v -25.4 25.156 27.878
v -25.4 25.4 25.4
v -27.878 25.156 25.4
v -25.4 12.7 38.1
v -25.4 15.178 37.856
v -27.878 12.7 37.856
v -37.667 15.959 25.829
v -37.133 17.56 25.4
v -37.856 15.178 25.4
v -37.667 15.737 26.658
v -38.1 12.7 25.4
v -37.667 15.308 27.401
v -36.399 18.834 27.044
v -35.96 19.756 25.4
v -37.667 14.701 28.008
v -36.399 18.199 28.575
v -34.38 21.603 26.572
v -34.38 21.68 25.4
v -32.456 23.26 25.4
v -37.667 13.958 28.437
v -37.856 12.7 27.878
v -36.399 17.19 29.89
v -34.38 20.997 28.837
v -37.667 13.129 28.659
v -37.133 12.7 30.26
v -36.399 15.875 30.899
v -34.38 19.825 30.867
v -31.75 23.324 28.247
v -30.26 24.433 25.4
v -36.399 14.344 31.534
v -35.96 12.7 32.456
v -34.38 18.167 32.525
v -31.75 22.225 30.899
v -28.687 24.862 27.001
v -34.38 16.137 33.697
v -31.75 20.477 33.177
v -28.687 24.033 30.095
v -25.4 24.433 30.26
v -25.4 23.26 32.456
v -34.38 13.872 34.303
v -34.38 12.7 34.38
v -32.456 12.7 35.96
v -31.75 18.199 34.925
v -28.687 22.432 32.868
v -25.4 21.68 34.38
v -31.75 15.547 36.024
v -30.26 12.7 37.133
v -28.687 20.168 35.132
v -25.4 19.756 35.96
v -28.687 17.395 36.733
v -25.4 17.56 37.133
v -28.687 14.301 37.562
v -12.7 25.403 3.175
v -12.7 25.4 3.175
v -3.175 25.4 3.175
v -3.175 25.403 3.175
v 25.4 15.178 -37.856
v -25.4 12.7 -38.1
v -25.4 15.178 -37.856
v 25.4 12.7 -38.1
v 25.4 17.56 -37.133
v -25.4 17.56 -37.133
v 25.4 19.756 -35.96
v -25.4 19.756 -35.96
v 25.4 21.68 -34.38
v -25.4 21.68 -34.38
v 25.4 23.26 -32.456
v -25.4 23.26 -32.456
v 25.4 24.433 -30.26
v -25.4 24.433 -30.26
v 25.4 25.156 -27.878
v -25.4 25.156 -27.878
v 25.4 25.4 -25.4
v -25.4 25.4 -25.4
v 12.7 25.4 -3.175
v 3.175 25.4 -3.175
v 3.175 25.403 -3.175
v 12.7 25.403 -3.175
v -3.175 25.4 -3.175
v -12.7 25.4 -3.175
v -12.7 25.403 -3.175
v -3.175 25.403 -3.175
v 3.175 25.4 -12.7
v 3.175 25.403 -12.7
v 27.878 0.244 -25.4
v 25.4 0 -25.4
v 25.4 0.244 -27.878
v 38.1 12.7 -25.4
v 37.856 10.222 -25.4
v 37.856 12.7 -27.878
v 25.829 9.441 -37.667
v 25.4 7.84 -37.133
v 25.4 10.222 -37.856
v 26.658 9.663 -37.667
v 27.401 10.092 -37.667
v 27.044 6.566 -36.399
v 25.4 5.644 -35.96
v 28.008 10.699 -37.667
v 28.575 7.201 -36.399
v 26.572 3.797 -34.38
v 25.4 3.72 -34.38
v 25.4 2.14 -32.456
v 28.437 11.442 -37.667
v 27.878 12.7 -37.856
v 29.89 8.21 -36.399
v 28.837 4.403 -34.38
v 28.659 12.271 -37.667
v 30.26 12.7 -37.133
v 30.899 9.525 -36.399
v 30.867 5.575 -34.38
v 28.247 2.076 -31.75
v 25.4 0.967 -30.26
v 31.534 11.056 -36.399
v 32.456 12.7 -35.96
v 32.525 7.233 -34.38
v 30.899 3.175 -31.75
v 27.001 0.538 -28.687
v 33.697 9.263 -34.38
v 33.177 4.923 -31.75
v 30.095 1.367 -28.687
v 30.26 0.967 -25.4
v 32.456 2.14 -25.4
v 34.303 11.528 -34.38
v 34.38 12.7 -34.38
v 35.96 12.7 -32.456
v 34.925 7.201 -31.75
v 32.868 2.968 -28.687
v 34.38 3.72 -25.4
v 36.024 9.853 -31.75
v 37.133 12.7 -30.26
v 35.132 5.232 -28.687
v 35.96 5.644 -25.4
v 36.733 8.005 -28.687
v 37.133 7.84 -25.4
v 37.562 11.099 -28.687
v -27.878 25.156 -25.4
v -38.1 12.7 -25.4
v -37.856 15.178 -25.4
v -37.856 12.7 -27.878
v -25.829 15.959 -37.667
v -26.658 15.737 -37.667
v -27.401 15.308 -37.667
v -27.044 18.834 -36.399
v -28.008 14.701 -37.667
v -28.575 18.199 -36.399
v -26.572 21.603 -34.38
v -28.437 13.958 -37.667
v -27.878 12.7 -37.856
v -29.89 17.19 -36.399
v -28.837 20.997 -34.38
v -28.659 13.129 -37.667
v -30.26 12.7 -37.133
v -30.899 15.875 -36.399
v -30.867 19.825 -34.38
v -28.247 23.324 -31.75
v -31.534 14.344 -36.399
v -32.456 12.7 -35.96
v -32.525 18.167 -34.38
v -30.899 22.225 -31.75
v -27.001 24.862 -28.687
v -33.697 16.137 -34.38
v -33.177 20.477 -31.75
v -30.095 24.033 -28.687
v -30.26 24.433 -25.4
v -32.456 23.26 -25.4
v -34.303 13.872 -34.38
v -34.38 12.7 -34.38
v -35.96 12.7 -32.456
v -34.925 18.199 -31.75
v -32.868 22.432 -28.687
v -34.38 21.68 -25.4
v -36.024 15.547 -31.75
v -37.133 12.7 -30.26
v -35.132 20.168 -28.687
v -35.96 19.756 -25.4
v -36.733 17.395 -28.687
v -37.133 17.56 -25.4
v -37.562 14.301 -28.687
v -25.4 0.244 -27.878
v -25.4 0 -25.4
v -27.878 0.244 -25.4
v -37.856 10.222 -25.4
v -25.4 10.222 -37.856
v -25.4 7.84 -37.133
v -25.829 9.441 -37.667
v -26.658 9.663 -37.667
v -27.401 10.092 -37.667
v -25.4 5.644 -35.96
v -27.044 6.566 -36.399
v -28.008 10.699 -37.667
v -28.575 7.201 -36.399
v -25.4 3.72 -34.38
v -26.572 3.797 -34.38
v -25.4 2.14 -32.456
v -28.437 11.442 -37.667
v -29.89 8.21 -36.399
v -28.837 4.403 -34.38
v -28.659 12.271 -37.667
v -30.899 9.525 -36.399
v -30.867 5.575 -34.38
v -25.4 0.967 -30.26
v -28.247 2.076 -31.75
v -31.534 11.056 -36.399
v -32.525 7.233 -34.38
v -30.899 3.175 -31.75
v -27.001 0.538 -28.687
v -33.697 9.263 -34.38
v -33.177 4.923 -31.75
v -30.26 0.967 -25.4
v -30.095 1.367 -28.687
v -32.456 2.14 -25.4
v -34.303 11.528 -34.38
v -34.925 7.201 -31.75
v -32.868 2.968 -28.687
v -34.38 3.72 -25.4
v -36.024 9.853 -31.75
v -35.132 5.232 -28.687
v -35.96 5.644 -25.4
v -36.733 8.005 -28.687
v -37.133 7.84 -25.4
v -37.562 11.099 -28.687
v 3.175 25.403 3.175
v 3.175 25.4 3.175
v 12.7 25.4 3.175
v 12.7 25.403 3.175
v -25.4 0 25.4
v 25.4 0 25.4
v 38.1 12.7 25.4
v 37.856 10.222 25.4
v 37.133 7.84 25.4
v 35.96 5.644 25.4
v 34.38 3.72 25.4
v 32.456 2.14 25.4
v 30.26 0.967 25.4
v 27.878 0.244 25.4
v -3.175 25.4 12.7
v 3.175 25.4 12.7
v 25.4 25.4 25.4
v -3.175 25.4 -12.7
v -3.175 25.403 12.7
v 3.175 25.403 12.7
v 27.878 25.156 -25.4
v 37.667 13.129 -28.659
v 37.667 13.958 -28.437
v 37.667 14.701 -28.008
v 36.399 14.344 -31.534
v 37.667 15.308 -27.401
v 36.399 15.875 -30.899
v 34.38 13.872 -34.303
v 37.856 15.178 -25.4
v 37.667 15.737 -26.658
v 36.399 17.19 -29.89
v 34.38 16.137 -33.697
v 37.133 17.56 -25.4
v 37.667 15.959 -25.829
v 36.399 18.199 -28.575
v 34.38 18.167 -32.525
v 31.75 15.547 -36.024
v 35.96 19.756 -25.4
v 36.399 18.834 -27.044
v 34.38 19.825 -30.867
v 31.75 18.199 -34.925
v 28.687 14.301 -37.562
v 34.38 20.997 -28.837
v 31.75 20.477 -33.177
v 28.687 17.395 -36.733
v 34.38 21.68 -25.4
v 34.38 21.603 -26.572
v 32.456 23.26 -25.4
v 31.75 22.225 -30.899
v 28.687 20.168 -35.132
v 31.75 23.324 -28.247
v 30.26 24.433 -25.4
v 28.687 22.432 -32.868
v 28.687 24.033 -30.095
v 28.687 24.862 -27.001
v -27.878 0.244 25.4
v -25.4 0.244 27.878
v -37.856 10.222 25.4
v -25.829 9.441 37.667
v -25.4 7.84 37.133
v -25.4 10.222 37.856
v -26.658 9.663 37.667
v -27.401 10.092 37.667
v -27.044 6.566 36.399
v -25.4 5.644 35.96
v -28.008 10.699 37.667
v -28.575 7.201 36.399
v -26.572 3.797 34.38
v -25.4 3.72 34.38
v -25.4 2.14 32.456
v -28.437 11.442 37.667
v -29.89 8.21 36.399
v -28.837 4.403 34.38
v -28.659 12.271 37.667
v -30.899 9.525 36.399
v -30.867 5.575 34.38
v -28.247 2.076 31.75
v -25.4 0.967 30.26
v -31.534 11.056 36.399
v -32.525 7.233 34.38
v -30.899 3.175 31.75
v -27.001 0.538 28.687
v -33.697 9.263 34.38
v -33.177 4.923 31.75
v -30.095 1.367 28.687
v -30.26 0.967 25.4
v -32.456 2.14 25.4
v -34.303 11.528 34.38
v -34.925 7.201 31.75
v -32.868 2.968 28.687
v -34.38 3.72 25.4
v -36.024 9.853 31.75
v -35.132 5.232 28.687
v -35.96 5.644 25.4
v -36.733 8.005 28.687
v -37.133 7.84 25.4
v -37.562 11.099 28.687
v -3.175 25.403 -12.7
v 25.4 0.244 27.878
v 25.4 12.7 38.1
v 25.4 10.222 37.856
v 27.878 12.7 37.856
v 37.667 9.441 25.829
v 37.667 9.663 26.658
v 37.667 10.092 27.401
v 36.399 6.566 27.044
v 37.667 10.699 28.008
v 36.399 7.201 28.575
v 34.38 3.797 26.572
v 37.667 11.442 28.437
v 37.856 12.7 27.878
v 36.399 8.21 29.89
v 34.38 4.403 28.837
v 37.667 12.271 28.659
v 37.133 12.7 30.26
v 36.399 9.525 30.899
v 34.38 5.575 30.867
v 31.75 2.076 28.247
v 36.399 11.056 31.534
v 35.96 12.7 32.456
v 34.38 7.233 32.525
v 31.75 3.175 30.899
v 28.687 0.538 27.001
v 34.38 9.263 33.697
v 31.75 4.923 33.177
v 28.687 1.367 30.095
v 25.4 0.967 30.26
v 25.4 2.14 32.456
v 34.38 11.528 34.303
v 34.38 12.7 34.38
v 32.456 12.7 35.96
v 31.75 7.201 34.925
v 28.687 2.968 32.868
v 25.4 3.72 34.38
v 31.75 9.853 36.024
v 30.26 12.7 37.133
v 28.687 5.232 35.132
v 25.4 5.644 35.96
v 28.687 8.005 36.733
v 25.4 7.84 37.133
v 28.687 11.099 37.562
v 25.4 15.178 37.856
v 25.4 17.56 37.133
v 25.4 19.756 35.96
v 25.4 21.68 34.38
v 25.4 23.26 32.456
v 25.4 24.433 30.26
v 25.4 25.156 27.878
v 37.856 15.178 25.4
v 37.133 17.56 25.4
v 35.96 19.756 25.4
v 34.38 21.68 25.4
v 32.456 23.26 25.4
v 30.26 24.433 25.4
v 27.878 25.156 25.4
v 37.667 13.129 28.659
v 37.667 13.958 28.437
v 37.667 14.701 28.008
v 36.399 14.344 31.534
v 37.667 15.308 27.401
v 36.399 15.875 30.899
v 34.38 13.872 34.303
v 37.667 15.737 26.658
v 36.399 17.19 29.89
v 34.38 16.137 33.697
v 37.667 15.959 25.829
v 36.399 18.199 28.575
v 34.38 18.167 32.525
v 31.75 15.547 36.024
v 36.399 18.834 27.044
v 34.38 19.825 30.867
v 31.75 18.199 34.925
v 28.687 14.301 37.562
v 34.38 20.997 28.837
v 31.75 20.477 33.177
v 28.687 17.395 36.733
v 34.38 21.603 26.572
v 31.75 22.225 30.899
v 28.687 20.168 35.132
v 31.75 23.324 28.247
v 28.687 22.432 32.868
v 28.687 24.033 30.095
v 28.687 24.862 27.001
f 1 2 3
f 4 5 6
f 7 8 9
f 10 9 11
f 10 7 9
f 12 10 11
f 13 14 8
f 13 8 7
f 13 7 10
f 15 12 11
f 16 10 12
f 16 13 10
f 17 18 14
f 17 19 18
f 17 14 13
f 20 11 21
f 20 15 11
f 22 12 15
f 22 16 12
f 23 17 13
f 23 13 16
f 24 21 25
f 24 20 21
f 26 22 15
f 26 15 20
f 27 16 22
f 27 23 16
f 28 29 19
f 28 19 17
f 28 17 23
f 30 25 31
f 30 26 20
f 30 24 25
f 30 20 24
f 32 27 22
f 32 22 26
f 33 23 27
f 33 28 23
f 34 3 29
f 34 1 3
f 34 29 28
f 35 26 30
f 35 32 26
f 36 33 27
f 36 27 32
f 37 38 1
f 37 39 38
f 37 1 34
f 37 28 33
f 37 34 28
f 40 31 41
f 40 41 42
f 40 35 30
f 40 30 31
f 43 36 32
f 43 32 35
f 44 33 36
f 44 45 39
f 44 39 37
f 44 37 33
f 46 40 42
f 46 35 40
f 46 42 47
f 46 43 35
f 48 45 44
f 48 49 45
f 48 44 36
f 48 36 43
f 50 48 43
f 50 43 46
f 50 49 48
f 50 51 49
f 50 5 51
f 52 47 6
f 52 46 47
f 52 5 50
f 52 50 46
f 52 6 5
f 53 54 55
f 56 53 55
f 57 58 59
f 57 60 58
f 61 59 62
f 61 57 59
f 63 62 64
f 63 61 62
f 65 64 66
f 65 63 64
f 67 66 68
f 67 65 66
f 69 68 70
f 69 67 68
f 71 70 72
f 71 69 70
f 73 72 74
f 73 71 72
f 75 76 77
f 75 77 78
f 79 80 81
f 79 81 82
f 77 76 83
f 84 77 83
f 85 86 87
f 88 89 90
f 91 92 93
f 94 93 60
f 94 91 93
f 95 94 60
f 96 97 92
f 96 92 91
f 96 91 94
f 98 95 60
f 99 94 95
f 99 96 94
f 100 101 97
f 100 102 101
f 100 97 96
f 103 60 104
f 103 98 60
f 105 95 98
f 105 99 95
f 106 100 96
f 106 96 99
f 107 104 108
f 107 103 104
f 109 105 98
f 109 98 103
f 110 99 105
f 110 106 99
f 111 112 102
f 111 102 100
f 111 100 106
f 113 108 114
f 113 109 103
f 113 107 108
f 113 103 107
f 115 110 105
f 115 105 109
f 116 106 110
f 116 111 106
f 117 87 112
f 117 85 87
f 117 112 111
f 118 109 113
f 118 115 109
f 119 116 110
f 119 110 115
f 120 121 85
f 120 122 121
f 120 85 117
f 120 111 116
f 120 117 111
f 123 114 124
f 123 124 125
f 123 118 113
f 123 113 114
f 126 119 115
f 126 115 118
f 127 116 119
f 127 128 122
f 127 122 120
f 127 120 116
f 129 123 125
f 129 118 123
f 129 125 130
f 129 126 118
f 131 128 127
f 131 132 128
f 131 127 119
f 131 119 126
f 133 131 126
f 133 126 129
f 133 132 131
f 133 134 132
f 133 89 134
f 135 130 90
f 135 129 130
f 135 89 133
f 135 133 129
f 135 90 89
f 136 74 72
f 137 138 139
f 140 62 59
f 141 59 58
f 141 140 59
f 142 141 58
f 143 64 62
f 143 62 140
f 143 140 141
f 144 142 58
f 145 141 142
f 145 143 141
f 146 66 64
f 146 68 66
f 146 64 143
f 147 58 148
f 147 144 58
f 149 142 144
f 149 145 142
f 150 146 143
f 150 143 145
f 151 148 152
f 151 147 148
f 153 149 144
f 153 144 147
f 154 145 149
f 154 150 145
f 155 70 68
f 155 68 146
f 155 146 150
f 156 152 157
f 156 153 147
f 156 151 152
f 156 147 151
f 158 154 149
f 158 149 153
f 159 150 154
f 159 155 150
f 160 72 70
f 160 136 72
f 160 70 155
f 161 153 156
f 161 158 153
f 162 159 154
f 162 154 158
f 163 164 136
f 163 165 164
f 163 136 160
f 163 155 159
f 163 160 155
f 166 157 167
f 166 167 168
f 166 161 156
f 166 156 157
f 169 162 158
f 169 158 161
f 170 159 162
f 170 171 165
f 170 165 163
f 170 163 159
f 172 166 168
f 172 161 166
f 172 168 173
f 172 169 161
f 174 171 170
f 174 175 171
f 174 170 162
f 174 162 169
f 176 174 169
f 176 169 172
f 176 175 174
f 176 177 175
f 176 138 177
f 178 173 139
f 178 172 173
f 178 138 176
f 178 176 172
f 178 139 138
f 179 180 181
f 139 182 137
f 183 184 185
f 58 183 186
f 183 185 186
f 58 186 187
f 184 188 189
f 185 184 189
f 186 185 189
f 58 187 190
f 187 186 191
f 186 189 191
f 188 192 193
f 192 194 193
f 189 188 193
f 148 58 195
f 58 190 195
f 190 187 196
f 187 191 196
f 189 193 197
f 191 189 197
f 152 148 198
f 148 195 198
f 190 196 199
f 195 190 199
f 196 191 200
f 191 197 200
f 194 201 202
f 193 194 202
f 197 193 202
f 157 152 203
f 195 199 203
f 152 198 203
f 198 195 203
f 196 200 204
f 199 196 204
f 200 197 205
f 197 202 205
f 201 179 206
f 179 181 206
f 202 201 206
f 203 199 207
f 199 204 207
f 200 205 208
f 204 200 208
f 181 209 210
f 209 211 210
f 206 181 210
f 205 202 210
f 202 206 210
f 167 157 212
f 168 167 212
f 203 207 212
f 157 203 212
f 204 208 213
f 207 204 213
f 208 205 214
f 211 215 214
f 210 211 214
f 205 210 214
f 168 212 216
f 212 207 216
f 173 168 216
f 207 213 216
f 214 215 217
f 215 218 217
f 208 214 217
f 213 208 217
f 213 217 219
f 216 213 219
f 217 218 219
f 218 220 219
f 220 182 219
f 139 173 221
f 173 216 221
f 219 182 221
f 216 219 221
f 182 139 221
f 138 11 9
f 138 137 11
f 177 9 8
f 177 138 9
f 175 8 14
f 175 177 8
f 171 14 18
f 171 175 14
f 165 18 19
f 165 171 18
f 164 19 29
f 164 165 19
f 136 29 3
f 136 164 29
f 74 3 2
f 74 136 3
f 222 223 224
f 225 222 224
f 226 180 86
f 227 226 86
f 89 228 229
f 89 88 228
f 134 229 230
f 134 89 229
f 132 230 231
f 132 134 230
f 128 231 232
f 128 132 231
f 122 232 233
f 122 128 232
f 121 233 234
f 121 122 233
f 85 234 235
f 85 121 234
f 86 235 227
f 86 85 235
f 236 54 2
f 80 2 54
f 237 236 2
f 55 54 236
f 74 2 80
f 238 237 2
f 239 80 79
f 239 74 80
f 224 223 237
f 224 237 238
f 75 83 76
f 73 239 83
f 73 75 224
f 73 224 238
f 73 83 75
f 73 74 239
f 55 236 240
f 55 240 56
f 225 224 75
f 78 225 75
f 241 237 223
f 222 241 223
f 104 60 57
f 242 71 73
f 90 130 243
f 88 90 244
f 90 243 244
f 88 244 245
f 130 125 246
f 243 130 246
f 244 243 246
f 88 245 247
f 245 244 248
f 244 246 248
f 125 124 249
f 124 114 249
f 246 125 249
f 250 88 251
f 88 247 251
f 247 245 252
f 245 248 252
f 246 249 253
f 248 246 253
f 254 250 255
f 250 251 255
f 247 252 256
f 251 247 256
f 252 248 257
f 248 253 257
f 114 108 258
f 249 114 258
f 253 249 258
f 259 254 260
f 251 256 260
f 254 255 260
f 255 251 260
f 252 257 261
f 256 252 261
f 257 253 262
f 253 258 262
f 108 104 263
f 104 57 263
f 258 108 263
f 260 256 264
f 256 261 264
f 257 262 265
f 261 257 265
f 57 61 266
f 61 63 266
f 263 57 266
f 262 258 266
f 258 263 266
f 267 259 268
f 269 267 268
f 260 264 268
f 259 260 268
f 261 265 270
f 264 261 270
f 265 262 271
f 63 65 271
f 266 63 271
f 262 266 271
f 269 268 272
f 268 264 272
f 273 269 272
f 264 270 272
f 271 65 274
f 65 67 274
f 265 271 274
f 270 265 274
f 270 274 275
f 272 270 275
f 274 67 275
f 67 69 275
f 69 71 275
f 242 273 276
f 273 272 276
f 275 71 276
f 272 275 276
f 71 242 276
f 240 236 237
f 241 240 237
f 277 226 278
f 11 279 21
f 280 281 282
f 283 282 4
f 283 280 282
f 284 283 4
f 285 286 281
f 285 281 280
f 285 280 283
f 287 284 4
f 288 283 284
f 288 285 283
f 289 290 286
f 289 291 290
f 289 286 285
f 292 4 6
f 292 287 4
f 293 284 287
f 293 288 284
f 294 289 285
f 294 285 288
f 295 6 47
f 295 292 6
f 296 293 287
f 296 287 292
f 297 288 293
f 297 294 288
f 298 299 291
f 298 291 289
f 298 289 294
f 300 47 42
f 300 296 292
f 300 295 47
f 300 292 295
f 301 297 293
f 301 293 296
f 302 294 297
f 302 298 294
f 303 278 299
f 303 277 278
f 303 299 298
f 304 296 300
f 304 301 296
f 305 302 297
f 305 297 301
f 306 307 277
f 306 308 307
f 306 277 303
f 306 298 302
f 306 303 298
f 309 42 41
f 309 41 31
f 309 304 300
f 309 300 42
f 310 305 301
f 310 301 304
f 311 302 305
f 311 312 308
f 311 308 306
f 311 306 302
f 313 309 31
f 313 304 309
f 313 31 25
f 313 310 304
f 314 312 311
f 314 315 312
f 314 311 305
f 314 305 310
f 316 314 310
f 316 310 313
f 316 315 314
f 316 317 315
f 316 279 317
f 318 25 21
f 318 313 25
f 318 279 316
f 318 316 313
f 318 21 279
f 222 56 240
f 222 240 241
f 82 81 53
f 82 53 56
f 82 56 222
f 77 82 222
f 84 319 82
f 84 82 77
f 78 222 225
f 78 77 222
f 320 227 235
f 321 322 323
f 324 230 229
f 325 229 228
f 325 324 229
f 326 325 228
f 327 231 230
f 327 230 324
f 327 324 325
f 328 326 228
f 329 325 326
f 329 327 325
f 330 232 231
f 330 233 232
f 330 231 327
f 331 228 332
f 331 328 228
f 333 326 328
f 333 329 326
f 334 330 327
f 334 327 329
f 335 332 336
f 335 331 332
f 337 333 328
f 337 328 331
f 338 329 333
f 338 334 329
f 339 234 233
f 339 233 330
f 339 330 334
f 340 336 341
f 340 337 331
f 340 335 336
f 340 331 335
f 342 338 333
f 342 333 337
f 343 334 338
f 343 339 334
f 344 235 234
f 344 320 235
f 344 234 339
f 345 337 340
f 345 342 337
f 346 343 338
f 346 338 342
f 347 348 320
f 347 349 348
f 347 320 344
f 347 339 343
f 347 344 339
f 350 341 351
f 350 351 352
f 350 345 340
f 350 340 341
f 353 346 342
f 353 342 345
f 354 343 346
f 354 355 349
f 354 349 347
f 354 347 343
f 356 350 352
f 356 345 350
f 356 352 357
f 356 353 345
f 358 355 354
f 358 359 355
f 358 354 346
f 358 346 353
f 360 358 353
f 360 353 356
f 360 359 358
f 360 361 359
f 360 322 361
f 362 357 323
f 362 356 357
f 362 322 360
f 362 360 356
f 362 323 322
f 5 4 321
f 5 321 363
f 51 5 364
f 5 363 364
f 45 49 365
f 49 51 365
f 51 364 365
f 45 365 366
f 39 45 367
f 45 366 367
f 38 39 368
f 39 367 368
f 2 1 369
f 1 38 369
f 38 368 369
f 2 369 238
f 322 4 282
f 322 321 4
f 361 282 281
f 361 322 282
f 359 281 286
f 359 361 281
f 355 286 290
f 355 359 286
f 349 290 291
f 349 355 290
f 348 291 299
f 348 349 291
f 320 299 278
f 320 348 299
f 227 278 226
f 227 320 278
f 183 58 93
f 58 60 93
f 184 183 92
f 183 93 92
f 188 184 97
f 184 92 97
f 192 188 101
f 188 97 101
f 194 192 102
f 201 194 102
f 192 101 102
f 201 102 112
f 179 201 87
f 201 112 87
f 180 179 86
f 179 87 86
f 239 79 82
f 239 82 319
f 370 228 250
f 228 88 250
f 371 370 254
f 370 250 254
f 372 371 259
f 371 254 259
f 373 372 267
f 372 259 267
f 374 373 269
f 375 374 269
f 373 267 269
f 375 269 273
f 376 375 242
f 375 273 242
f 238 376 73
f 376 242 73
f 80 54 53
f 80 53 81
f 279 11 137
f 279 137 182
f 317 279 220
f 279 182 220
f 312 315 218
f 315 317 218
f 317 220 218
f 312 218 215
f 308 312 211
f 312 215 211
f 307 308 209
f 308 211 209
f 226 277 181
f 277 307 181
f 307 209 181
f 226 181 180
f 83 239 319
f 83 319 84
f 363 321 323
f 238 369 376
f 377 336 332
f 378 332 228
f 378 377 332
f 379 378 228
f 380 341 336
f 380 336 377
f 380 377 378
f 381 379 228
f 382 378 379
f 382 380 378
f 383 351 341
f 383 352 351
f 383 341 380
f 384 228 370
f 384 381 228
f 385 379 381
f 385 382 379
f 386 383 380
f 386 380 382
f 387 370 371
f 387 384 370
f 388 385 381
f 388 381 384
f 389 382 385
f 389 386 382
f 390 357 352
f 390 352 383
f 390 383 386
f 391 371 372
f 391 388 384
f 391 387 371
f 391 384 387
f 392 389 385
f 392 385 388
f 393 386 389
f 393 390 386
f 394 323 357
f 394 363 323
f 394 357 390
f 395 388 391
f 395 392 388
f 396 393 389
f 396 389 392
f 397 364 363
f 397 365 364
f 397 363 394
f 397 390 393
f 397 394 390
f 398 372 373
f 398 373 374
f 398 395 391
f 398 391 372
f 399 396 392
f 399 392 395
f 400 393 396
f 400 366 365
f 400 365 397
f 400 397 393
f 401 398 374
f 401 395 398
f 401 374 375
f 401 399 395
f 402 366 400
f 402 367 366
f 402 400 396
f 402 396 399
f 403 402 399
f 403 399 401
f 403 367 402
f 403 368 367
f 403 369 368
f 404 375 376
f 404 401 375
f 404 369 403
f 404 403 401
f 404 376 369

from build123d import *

# Parameters (mm, degrees)
SKETCH1_W           = 76.2
SKETCH1_H           = 76.2
BOSS_EXTRUDE1_DEPTH = 25.4
FILLET1_R           = 12.7
SKETCH2_W           = 6.35
SKETCH2_H           = 25.4
SKETCH2_W_2         = 25.4
SKETCH2_H_2         = 6.35
BOSS_EXTRUDE2_DEPTH = 0.00254


with BuildPart() as part:
    # Sketch1 → Boss-Extrude1 (new body)
    with BuildSketch(Plane(origin=(0, 0, 0), x_dir=(1, 0, 0), z_dir=(0, 1, 0))):
        Rectangle(SKETCH1_W, SKETCH1_H)
    extrude(amount=BOSS_EXTRUDE1_DEPTH)

    # Fillet1
    fillet1_edges = [part.edges().sort_by_distance(p)[0] for p in [
        (0, 25.4, 38.1),
        (-38.1, 25.4, 0),
        (0, 25.4, -38.1),
        (-38.1, 0, 0),
        (0, 0, 38.1),
        (38.1, 0, 0),
        (0, 0, -38.1),
        (-38.1, 12.7, -38.1),
        (-38.1, 12.7, 38.1),
        (38.1, 12.7, 38.1),
        (38.1, 12.7, -38.1),
        (38.1, 25.4, 0),
    ]]
    fillet(fillet1_edges, radius=FILLET1_R - 0.0001)  # a hair under: the kernel refuses the full size

    # Sketch2 → Boss-Extrude2 (add)
    with BuildSketch(Plane(origin=(0, 25.4, 0), x_dir=(1, 0, 0), z_dir=(0, 1, 0))):
        Rectangle(SKETCH2_W, SKETCH2_H)
        Rectangle(SKETCH2_W_2, SKETCH2_H_2)
    extrude(amount=BOSS_EXTRUDE2_DEPTH)


solid = part.part
